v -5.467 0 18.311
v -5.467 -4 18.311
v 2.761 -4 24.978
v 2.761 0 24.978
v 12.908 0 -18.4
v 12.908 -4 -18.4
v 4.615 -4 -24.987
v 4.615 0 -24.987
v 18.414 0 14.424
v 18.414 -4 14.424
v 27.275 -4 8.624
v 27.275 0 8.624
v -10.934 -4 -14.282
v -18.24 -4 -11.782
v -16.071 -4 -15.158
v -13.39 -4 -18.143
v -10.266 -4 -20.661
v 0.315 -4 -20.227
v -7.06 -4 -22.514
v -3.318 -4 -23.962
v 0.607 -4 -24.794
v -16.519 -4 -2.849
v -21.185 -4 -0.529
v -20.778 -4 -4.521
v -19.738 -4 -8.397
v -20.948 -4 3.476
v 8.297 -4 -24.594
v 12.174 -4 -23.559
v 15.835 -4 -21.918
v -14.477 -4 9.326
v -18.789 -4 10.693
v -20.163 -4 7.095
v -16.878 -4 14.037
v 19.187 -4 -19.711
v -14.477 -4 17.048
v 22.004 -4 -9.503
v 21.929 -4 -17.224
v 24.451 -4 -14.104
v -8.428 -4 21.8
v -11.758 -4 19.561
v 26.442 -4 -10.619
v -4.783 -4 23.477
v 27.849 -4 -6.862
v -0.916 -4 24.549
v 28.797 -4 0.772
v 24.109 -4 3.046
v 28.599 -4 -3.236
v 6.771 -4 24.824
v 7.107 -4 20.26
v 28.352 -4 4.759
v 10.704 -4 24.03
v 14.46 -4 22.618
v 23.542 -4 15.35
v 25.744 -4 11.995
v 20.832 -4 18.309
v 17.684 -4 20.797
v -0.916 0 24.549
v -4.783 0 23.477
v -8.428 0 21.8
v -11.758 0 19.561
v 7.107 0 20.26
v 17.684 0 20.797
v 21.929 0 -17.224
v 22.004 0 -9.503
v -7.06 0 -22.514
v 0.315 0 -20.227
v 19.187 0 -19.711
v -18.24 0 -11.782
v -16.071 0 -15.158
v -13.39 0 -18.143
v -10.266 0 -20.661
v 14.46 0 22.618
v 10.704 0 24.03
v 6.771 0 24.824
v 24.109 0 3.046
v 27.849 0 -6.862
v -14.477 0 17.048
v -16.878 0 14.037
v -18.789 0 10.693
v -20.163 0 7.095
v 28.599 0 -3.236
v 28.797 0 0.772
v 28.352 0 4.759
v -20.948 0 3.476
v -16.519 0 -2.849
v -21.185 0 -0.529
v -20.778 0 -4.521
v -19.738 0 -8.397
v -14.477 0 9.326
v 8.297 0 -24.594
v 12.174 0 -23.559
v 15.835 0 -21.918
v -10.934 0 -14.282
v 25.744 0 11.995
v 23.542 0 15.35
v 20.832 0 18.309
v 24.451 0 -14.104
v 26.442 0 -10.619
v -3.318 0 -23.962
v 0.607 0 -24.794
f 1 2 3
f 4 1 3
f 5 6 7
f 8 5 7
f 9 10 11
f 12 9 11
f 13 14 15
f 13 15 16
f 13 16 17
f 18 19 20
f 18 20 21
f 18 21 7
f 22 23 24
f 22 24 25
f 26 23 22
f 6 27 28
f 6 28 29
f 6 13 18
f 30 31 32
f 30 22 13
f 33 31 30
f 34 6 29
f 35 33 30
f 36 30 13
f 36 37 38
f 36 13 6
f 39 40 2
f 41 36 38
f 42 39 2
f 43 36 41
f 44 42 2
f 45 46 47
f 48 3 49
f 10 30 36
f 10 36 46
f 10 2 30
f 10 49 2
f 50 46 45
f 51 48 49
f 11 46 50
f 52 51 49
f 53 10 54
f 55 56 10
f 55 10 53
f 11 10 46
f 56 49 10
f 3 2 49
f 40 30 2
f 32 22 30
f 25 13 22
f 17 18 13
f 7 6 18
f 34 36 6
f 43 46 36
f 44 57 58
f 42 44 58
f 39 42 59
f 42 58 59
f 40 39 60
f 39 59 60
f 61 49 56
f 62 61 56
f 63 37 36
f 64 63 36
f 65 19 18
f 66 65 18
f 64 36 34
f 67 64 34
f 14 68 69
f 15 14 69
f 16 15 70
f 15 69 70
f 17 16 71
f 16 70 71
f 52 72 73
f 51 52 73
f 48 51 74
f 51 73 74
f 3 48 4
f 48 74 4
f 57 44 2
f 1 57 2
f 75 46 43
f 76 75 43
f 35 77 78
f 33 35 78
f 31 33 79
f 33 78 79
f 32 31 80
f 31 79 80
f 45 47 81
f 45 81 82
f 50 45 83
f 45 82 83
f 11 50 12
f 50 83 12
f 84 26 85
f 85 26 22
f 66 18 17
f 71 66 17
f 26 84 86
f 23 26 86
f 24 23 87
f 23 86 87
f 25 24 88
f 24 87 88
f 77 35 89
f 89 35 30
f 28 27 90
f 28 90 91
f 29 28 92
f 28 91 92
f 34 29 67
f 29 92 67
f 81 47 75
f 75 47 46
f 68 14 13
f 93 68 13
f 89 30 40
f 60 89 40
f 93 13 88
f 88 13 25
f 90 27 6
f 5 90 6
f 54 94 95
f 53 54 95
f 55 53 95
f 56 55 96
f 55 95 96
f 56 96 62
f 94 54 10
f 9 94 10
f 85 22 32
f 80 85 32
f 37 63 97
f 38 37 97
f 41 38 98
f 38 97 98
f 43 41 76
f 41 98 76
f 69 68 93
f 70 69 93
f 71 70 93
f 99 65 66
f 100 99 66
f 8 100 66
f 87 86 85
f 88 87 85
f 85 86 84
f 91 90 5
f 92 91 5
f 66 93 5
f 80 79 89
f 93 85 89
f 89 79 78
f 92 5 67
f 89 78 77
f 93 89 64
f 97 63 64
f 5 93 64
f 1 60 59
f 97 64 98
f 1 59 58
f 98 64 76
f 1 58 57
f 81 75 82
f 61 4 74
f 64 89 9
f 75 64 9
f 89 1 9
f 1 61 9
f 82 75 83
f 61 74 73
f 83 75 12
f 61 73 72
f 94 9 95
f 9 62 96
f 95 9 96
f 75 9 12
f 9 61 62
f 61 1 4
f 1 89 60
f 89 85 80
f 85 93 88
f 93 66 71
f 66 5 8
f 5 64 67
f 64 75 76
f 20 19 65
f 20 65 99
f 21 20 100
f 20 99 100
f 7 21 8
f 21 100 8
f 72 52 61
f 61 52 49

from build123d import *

# Parameters (mm, degrees)
F0_R     = 25
F1_DEPTH = 4
F3_DEPTH = 25


with BuildPart() as f1:
    # F0 (on Front) → F1 (new body)
    with BuildSketch(Plane.XZ):
        with Locations((3.8093454119, 0)):
            Circle(F0_R)
    extrude(amount=F1_DEPTH)

    # F2 (on face) → F3 (cut)
    with BuildSketch(Plane.XZ.offset(4)):
        with BuildLine():
            ThreePointArc((-11.7582220598, 19.5614632125), (-13.1639870123, 18.354998949), (-14.4765553037, 17.0477516118))
            Line((-14.4765553037, 17.0477516118), (-14.4765553037, 9.326151153))
            Line((-14.4765553037, 9.326151153), (-11.7582220598, 19.5614632125))
        make_face()
        with BuildLine():
            ThreePointArc((2.7612951022, 24.9780221504), (0.9145785092, 24.8318409422), (-0.9162435852, 24.5493138118))
            Line((-0.9162435852, 24.5493138118), (-5.4669922591, 18.3112211424))
            Line((-5.4669922591, 18.3112211424), (2.7612951022, 24.9780221504))
        make_face()
        with BuildLine():
            ThreePointArc((17.6835243201, 20.7968064765), (16.1054546899, 21.7670782749), (14.4598699542, 22.6178320573))
            Line((14.4598699542, 22.6178320573), (7.106992246, 20.2602266935))
            Line((7.106992246, 20.2602266935), (17.6835243201, 20.7968064765))
        make_face()
        with BuildLine():
            ThreePointArc((27.2746171782, 8.6244432247), (26.5715658455, 10.338342272), (25.7435324005, 11.9954758618))
            Line((25.7435324005, 11.9954758618), (18.4138599684, 14.4242647952))
            Line((18.4138599684, 14.4242647952), (27.2746171782, 8.6244432247))
        make_face()
        with BuildLine():
            ThreePointArc((27.8492079184, -6.8618518398), (28.2913215022, -5.0628891666), (28.5990101913, -3.2361273346))
            Line((28.5990101913, -3.2361273346), (24.1089607469, 3.0457967044))
            Line((24.1089607469, 3.0457967044), (27.8492079184, -6.8618518398))
        make_face()
        with BuildLine():
            Line((22.0039590385, -9.5030150632), (19.1865107481, -19.7114886861))
            ThreePointArc((19.1865107481, -19.7114886861), (20.603907642, -18.5187116048), (21.9290894609, -17.2242525411))
            Line((21.9290894609, -17.2242525411), (22.0039590385, -9.5030150632))
        make_face()
        with BuildLine():
            Line((12.9076991878, -18.4003048584), (4.6151565122, -24.9870099946))
            ThreePointArc((4.6151565122, -24.9870099946), (6.4632036846, -24.8587416469), (8.2966791322, -24.5939796715))
            Line((8.2966791322, -24.5939796715), (12.9076991878, -18.4003048584))
        make_face()
        with BuildLine():
            Line((0.3154079719, -20.2272999058), (-10.2658296583, -20.661303123))
            ThreePointArc((-10.2658296583, -20.661303123), (-8.6972420842, -21.6468304655), (-7.0599837172, -22.5135000452))
            Line((-7.0599837172, -22.5135000452), (0.3154079719, -20.2272999058))
        make_face()
        with BuildLine():
            Line((-10.934342035, -14.2819795819), (-19.7384469382, -8.3965156722))
            ThreePointArc((-19.7384469382, -8.3965156722), (-19.0520468287, -10.1171510229), (-18.2401200772, -11.7822354264))
            Line((-18.2401200772, -11.7822354264), (-10.934342035, -14.2819795819))
        make_face()
        with BuildLine():
            Line((-16.5188480842, -2.8488259856), (-20.1628536664, 7.0946227067))
            ThreePointArc((-20.1628536664, 7.0946227067), (-20.6223894281, 5.3000313871), (-20.9477761583, 3.4763388154))
            Line((-20.9477761583, 3.4763388154), (-16.5188480842, -2.8488259856))
        make_face()
    extrude(amount=-F3_DEPTH, mode=Mode.SUBTRACT)


solid = f1.part
